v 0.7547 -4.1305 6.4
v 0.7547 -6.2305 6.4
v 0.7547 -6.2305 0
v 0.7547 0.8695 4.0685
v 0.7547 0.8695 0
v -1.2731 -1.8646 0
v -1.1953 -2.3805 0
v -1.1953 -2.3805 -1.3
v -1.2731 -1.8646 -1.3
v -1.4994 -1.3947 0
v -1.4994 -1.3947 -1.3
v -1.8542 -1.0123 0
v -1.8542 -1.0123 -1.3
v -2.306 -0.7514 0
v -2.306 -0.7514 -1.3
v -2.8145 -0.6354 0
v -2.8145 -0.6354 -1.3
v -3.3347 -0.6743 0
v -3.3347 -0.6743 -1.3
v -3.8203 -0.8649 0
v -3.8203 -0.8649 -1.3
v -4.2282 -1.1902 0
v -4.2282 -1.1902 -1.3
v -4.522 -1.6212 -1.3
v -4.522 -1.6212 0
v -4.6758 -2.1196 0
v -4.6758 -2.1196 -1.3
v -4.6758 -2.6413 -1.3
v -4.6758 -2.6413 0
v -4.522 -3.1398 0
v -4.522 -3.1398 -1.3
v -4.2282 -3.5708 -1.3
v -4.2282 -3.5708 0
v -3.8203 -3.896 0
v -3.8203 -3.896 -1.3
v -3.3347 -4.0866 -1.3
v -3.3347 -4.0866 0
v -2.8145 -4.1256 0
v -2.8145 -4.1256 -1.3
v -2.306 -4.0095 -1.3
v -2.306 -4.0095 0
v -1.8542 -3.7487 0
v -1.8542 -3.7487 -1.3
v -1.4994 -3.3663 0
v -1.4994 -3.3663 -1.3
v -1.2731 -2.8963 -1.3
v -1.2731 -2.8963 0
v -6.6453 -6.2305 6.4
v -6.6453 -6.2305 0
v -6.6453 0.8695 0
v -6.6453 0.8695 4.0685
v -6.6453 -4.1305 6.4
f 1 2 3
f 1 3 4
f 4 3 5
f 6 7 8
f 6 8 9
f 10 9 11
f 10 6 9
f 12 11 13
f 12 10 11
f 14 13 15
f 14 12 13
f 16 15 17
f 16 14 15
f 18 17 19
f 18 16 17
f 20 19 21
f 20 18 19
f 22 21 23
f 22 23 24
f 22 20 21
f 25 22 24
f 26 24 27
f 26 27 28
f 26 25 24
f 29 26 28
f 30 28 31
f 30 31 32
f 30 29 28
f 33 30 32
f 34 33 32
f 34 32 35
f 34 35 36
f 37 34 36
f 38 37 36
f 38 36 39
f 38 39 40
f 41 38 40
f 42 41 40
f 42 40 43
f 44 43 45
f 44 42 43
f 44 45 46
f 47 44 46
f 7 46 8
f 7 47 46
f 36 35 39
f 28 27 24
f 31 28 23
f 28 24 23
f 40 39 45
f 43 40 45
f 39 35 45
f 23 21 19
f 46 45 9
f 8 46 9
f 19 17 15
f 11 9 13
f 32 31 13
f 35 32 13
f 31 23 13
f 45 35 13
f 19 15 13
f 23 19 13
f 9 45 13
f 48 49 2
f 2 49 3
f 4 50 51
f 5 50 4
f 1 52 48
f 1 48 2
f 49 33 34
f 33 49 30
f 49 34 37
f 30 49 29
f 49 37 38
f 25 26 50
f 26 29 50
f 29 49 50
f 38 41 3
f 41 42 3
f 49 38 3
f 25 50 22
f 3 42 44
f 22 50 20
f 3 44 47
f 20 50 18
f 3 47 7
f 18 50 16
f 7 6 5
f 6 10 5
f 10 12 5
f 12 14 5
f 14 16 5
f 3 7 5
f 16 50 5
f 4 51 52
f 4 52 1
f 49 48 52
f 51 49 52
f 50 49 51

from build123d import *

# Parameters (mm, degrees)
SKETCH_1_W      = 7.4
SKETCH_1_H      = 7.1
EXTRUDE_1_DEPTH = 6.4
SKETCH_1_3_R    = 1.75
EXTRUDE_2_DEPTH = 1.3
CHAMFER_1_SIZE  = 5
CHAMFER_1_SIZE2 = 2.331538291


with BuildPart() as part:
    # Эскиз1 → Бобышка-Вытянуть1 (new body)
    with BuildSketch(Plane.XY):
        with Locations((-2.9453125, -2.68046875)):
            Rectangle(SKETCH_1_W, SKETCH_1_H)
    extrude(amount=EXTRUDE_1_DEPTH)

    # Эскиз1<3> → Бобышка-Вытянуть2 (add)
    with BuildSketch(Plane.XY):
        with Locations((-2.9453125, -2.38046875)):
            Circle(SKETCH_1_3_R)
    extrude(amount=-EXTRUDE_2_DEPTH)

    # Фаска1
    chamfer_1_edges = [part.edges().sort_by_distance(p)[0] for p in [
        (-2.9453125, 0.86953125, 6.4),
    ]]
    chamfer_1_side = [part.faces().sort_by_distance(p)[0] for p in [
        (-2.9453125, -2.68046875, 6.4),
    ]]
    chamfer(chamfer_1_edges, length=CHAMFER_1_SIZE, length2=CHAMFER_1_SIZE2, reference=chamfer_1_side[0])


solid = part.part
